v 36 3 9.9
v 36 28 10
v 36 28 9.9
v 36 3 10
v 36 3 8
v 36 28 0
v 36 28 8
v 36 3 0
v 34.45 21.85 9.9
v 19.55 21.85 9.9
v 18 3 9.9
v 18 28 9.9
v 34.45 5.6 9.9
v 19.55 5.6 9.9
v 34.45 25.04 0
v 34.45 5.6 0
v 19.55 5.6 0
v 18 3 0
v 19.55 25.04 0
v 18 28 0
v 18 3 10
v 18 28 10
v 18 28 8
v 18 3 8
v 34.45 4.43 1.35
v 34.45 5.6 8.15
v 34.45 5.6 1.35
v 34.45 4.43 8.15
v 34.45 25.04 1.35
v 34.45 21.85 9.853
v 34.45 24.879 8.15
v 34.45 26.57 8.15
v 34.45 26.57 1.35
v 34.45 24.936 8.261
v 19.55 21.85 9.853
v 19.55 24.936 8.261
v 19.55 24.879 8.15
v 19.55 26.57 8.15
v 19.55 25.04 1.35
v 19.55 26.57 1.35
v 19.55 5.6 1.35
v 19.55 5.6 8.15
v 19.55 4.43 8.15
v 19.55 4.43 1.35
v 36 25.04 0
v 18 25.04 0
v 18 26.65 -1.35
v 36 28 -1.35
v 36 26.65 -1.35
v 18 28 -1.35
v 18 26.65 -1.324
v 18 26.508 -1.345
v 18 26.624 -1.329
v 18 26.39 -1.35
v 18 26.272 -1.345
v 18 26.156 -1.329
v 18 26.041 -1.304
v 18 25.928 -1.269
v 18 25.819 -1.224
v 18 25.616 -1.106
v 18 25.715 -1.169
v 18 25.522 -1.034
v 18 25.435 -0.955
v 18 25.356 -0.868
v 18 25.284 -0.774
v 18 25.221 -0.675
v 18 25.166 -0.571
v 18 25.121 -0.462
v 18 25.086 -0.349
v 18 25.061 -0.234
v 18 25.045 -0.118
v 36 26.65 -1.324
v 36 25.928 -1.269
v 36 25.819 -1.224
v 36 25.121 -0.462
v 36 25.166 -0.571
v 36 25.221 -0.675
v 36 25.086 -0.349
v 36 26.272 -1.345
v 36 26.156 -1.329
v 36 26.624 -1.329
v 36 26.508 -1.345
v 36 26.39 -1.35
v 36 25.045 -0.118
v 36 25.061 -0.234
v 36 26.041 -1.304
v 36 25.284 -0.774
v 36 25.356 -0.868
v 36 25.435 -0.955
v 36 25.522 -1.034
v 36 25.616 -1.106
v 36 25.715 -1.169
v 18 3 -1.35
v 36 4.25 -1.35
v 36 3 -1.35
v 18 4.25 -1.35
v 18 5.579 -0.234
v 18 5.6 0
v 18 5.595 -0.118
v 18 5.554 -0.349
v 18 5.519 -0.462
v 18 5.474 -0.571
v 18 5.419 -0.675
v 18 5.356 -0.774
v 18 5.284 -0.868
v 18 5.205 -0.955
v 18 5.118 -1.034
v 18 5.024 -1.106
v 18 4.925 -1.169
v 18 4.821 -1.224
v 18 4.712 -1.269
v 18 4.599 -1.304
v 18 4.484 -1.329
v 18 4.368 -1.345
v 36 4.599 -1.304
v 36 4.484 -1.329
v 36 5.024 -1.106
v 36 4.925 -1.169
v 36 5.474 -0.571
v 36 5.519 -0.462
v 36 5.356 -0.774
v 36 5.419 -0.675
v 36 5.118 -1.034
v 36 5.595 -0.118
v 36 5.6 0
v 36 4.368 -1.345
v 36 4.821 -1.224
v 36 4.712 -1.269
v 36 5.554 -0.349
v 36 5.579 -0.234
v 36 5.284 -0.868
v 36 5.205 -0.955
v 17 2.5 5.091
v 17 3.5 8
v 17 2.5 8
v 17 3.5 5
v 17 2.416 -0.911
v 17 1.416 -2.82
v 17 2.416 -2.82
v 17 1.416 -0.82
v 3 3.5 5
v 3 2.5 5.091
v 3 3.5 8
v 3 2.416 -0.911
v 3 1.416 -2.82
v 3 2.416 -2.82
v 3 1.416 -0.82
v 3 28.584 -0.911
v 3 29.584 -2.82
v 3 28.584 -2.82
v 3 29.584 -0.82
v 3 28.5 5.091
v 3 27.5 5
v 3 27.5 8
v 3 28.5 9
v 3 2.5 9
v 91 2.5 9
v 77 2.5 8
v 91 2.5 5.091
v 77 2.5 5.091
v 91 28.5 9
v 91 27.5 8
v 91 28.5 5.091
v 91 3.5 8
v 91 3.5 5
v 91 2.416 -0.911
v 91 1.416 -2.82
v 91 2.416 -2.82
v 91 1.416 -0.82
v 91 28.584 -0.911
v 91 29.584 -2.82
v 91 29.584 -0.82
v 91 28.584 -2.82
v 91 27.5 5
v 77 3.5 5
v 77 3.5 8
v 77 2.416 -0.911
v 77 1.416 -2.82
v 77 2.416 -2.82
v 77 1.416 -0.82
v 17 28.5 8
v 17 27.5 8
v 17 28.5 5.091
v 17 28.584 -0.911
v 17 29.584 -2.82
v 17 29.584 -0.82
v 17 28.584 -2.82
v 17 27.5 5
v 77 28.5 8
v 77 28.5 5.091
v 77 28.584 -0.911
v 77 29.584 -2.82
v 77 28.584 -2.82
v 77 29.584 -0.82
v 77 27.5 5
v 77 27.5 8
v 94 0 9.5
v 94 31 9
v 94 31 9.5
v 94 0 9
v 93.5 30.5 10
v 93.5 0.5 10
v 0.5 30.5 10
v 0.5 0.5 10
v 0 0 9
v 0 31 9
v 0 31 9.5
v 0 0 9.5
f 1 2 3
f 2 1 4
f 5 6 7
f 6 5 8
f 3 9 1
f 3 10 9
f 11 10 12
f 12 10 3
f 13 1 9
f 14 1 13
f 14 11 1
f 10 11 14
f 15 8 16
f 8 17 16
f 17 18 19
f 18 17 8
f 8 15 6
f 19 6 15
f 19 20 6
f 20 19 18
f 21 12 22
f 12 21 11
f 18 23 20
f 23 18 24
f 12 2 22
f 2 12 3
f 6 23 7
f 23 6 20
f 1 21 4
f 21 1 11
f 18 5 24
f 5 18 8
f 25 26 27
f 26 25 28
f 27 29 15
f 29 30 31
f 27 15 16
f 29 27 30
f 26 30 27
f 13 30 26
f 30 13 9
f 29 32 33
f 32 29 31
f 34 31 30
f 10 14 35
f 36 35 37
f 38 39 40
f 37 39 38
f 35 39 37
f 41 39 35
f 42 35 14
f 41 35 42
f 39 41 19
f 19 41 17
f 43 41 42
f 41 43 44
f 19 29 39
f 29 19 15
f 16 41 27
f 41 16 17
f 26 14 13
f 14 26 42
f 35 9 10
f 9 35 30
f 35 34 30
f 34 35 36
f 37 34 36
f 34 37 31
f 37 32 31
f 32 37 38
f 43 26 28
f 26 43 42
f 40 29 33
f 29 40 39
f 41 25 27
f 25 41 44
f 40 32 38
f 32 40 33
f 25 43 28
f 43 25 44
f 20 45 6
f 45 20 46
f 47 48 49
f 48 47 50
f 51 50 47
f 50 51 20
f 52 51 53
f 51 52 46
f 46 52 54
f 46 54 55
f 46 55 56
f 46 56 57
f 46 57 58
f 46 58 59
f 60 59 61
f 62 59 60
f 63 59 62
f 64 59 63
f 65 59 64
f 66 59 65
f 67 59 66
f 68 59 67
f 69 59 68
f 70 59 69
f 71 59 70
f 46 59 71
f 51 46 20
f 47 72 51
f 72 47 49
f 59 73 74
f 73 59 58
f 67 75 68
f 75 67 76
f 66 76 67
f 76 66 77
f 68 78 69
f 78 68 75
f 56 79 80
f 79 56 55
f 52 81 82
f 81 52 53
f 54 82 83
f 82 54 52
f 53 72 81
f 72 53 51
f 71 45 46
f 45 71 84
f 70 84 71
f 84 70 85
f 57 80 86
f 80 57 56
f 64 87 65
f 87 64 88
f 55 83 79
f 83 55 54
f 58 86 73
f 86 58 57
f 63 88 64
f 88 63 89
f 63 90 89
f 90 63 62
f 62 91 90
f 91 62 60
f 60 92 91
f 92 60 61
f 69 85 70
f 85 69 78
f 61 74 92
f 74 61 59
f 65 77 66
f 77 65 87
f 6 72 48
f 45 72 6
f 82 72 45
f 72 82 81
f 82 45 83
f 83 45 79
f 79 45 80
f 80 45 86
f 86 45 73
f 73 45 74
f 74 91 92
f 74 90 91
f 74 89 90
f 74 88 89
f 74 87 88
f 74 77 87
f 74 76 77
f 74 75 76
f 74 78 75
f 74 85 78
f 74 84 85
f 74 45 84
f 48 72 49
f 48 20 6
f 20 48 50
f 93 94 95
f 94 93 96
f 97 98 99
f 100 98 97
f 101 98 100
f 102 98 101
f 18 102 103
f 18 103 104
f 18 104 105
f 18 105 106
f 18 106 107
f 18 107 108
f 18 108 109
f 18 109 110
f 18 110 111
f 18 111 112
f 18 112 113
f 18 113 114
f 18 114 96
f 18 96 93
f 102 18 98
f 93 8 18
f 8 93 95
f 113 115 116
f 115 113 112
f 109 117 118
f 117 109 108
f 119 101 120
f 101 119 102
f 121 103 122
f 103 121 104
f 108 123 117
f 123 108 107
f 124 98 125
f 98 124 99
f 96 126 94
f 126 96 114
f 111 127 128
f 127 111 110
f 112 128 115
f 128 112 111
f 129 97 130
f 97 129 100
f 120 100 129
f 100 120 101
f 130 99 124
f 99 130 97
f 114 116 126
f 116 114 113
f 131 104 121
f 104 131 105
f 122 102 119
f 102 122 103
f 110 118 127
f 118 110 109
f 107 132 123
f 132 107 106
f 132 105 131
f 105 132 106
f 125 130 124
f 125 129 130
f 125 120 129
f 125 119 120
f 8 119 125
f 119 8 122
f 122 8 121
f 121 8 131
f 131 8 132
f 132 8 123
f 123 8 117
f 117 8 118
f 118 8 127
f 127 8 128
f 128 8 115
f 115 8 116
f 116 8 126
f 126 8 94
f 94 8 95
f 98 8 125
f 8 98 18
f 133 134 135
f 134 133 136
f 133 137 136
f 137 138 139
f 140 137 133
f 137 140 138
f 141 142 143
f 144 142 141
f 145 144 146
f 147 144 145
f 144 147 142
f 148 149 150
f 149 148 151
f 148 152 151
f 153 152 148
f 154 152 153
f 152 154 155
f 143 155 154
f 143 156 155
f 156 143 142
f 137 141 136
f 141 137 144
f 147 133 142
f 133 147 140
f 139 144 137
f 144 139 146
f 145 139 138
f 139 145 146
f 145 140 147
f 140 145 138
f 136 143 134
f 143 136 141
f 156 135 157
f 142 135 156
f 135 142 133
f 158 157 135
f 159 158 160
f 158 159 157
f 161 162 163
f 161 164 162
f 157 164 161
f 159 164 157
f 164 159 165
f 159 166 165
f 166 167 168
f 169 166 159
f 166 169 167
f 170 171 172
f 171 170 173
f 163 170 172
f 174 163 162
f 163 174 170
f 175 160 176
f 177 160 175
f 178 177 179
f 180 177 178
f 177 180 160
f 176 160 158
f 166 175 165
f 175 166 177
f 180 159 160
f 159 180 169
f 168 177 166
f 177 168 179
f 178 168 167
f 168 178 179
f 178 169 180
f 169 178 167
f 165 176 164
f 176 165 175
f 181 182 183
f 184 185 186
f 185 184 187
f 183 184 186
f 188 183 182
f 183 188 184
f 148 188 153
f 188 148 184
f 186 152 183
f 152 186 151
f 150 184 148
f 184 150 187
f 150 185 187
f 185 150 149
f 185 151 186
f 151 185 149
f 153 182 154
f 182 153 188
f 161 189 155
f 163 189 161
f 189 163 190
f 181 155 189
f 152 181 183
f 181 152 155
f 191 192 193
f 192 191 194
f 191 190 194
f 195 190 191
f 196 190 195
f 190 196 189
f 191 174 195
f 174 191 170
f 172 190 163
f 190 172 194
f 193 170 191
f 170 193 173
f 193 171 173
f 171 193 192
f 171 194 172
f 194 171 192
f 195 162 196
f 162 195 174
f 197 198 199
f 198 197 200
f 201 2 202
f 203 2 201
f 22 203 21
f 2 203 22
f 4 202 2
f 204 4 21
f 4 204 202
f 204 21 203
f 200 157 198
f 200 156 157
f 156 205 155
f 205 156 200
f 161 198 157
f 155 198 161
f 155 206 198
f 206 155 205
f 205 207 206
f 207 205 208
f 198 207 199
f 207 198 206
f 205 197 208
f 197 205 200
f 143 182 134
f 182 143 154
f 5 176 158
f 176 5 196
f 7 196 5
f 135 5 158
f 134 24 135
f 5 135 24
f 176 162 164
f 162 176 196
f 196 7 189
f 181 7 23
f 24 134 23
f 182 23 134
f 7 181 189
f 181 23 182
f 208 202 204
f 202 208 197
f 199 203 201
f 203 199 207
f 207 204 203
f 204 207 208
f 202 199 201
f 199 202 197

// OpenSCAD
$fa = 5;
$fs = 0.01;

/*
 * The RJ45 keystone receiver
 */
module rj45Receiver() {
	difference() {
		cube([18, 25, 9.9]);
		translate([1.55, 2.6, 0]) {
			cube([14.9, 19.44, 7.9]);
		}
		translate([1.55, 2.6, 7.9]) {
			cube([14.9, 16.25, 2]);
		}
		translate([1.55, 17.45, 7.2]) {
			rotate(v=[1, 0, 0], a=-27.3) {
				cube([14.9, 3.5, 3]);
			}
		}
		translate([1.55, 1.43, 1.35]) {
			cube([14.9, 22.14, 6.8]);
		}
	}
	translate([0, 22.04, -1.35]) {
		intersection() {
			cube([18, 2.96, 1.35]);
			union() {
				translate([0, 1.61, 0]) {
					cube([20.42, 1.61, 1.35]);
				}
				translate([0, 1.35, 1.35]) {
					rotate(v=[0, 1, 0], a=90) {
						cylinder(h=20.42, r=1.35);
					}
				}
			}
		}
	}

	translate([0, 0, -1.35]) {
		intersection() {
			cube([18, 2.6, 1.35]);
			union() {
				cube([20.42, 1.25, 1.35]);
				translate([0, 1.25, 1.35]) {
					rotate(v=[0, 1, 0], a=90) {
						cylinder(h=20.42, r=1.35);
					}
				}
			}
		}
	}
}

/*
 * So a hole can be cut for the keystone socket
 */
module rj45VolumeBlock() {
	cube([18, 25, 9.9]);
}

module clip() {
    cube([14, 1, 4]);
    /*translate([0, -4, 4]) {
        cube([4, 4, 0.25]);
    }*/
    translate([0, 1, 4]) {
        rotate(v=[1, 0, 0], a=10.389) {
            mirror([0, 1, 0]) {
                cube([14, 1, 6.1]);
            }
            translate([0, -1, 6.1]) {
                rotate(v=[1, 0, 0], a=-10.389) {
                    cube([14, 1, 2]);
                }
            }
        }
    }
}
module clip_set() {
    clip();
    translate([74, 0, 0]) {
        clip();
    }
}

module faceplate() {
    translate([3, 2.5, 0]) {
        mirror([0, 0, 1]) {
            clip_set();
        }
    }
    translate([3, 28.5, 0]) {
        mirror([0, 1, 0]) {
            mirror([0, 0, 1]) {
                clip_set();
            }
        }
    }
    difference() {
        union() {
            cube([94, 31, 1]);
            translate([3, 2.5, -1]) {
                cube([88, 26, 1]);
            }
        }
        translate([0, -0.25, 0.25]) {
            rotate(v=[1, 0, 0], a=45) {
                cube([94, 3, 3]);
            }
        }
        translate([0, 31, 0]) {
            translate([0, 0.25, 0.25]) {
                rotate(v=[1, 0, 0], a=45) {
                        cube([94, 3, 3]);
                }
            }
        }
        translate([-0.25, 0, 0.25]) {
            rotate(v=[0, 1, 0], a=-45) {
                cube([3, 31, 3]);
            }
        }
        translate([94, 0, 0]) {
            translate([0.25, 0, 0.25]) {
                rotate(v=[0, 1, 0], a=-45) {
                    cube([3, 31, 3]);
                }
            }
        }
    }
}

union() {
    translate([18, 3, 0]) {
        rj45Receiver();
    }
    difference() {
        translate([0, 0, 9]) {
            faceplate();
        }
        translate([18, 3, 1]) {
            rj45VolumeBlock();
        }
    }
}
